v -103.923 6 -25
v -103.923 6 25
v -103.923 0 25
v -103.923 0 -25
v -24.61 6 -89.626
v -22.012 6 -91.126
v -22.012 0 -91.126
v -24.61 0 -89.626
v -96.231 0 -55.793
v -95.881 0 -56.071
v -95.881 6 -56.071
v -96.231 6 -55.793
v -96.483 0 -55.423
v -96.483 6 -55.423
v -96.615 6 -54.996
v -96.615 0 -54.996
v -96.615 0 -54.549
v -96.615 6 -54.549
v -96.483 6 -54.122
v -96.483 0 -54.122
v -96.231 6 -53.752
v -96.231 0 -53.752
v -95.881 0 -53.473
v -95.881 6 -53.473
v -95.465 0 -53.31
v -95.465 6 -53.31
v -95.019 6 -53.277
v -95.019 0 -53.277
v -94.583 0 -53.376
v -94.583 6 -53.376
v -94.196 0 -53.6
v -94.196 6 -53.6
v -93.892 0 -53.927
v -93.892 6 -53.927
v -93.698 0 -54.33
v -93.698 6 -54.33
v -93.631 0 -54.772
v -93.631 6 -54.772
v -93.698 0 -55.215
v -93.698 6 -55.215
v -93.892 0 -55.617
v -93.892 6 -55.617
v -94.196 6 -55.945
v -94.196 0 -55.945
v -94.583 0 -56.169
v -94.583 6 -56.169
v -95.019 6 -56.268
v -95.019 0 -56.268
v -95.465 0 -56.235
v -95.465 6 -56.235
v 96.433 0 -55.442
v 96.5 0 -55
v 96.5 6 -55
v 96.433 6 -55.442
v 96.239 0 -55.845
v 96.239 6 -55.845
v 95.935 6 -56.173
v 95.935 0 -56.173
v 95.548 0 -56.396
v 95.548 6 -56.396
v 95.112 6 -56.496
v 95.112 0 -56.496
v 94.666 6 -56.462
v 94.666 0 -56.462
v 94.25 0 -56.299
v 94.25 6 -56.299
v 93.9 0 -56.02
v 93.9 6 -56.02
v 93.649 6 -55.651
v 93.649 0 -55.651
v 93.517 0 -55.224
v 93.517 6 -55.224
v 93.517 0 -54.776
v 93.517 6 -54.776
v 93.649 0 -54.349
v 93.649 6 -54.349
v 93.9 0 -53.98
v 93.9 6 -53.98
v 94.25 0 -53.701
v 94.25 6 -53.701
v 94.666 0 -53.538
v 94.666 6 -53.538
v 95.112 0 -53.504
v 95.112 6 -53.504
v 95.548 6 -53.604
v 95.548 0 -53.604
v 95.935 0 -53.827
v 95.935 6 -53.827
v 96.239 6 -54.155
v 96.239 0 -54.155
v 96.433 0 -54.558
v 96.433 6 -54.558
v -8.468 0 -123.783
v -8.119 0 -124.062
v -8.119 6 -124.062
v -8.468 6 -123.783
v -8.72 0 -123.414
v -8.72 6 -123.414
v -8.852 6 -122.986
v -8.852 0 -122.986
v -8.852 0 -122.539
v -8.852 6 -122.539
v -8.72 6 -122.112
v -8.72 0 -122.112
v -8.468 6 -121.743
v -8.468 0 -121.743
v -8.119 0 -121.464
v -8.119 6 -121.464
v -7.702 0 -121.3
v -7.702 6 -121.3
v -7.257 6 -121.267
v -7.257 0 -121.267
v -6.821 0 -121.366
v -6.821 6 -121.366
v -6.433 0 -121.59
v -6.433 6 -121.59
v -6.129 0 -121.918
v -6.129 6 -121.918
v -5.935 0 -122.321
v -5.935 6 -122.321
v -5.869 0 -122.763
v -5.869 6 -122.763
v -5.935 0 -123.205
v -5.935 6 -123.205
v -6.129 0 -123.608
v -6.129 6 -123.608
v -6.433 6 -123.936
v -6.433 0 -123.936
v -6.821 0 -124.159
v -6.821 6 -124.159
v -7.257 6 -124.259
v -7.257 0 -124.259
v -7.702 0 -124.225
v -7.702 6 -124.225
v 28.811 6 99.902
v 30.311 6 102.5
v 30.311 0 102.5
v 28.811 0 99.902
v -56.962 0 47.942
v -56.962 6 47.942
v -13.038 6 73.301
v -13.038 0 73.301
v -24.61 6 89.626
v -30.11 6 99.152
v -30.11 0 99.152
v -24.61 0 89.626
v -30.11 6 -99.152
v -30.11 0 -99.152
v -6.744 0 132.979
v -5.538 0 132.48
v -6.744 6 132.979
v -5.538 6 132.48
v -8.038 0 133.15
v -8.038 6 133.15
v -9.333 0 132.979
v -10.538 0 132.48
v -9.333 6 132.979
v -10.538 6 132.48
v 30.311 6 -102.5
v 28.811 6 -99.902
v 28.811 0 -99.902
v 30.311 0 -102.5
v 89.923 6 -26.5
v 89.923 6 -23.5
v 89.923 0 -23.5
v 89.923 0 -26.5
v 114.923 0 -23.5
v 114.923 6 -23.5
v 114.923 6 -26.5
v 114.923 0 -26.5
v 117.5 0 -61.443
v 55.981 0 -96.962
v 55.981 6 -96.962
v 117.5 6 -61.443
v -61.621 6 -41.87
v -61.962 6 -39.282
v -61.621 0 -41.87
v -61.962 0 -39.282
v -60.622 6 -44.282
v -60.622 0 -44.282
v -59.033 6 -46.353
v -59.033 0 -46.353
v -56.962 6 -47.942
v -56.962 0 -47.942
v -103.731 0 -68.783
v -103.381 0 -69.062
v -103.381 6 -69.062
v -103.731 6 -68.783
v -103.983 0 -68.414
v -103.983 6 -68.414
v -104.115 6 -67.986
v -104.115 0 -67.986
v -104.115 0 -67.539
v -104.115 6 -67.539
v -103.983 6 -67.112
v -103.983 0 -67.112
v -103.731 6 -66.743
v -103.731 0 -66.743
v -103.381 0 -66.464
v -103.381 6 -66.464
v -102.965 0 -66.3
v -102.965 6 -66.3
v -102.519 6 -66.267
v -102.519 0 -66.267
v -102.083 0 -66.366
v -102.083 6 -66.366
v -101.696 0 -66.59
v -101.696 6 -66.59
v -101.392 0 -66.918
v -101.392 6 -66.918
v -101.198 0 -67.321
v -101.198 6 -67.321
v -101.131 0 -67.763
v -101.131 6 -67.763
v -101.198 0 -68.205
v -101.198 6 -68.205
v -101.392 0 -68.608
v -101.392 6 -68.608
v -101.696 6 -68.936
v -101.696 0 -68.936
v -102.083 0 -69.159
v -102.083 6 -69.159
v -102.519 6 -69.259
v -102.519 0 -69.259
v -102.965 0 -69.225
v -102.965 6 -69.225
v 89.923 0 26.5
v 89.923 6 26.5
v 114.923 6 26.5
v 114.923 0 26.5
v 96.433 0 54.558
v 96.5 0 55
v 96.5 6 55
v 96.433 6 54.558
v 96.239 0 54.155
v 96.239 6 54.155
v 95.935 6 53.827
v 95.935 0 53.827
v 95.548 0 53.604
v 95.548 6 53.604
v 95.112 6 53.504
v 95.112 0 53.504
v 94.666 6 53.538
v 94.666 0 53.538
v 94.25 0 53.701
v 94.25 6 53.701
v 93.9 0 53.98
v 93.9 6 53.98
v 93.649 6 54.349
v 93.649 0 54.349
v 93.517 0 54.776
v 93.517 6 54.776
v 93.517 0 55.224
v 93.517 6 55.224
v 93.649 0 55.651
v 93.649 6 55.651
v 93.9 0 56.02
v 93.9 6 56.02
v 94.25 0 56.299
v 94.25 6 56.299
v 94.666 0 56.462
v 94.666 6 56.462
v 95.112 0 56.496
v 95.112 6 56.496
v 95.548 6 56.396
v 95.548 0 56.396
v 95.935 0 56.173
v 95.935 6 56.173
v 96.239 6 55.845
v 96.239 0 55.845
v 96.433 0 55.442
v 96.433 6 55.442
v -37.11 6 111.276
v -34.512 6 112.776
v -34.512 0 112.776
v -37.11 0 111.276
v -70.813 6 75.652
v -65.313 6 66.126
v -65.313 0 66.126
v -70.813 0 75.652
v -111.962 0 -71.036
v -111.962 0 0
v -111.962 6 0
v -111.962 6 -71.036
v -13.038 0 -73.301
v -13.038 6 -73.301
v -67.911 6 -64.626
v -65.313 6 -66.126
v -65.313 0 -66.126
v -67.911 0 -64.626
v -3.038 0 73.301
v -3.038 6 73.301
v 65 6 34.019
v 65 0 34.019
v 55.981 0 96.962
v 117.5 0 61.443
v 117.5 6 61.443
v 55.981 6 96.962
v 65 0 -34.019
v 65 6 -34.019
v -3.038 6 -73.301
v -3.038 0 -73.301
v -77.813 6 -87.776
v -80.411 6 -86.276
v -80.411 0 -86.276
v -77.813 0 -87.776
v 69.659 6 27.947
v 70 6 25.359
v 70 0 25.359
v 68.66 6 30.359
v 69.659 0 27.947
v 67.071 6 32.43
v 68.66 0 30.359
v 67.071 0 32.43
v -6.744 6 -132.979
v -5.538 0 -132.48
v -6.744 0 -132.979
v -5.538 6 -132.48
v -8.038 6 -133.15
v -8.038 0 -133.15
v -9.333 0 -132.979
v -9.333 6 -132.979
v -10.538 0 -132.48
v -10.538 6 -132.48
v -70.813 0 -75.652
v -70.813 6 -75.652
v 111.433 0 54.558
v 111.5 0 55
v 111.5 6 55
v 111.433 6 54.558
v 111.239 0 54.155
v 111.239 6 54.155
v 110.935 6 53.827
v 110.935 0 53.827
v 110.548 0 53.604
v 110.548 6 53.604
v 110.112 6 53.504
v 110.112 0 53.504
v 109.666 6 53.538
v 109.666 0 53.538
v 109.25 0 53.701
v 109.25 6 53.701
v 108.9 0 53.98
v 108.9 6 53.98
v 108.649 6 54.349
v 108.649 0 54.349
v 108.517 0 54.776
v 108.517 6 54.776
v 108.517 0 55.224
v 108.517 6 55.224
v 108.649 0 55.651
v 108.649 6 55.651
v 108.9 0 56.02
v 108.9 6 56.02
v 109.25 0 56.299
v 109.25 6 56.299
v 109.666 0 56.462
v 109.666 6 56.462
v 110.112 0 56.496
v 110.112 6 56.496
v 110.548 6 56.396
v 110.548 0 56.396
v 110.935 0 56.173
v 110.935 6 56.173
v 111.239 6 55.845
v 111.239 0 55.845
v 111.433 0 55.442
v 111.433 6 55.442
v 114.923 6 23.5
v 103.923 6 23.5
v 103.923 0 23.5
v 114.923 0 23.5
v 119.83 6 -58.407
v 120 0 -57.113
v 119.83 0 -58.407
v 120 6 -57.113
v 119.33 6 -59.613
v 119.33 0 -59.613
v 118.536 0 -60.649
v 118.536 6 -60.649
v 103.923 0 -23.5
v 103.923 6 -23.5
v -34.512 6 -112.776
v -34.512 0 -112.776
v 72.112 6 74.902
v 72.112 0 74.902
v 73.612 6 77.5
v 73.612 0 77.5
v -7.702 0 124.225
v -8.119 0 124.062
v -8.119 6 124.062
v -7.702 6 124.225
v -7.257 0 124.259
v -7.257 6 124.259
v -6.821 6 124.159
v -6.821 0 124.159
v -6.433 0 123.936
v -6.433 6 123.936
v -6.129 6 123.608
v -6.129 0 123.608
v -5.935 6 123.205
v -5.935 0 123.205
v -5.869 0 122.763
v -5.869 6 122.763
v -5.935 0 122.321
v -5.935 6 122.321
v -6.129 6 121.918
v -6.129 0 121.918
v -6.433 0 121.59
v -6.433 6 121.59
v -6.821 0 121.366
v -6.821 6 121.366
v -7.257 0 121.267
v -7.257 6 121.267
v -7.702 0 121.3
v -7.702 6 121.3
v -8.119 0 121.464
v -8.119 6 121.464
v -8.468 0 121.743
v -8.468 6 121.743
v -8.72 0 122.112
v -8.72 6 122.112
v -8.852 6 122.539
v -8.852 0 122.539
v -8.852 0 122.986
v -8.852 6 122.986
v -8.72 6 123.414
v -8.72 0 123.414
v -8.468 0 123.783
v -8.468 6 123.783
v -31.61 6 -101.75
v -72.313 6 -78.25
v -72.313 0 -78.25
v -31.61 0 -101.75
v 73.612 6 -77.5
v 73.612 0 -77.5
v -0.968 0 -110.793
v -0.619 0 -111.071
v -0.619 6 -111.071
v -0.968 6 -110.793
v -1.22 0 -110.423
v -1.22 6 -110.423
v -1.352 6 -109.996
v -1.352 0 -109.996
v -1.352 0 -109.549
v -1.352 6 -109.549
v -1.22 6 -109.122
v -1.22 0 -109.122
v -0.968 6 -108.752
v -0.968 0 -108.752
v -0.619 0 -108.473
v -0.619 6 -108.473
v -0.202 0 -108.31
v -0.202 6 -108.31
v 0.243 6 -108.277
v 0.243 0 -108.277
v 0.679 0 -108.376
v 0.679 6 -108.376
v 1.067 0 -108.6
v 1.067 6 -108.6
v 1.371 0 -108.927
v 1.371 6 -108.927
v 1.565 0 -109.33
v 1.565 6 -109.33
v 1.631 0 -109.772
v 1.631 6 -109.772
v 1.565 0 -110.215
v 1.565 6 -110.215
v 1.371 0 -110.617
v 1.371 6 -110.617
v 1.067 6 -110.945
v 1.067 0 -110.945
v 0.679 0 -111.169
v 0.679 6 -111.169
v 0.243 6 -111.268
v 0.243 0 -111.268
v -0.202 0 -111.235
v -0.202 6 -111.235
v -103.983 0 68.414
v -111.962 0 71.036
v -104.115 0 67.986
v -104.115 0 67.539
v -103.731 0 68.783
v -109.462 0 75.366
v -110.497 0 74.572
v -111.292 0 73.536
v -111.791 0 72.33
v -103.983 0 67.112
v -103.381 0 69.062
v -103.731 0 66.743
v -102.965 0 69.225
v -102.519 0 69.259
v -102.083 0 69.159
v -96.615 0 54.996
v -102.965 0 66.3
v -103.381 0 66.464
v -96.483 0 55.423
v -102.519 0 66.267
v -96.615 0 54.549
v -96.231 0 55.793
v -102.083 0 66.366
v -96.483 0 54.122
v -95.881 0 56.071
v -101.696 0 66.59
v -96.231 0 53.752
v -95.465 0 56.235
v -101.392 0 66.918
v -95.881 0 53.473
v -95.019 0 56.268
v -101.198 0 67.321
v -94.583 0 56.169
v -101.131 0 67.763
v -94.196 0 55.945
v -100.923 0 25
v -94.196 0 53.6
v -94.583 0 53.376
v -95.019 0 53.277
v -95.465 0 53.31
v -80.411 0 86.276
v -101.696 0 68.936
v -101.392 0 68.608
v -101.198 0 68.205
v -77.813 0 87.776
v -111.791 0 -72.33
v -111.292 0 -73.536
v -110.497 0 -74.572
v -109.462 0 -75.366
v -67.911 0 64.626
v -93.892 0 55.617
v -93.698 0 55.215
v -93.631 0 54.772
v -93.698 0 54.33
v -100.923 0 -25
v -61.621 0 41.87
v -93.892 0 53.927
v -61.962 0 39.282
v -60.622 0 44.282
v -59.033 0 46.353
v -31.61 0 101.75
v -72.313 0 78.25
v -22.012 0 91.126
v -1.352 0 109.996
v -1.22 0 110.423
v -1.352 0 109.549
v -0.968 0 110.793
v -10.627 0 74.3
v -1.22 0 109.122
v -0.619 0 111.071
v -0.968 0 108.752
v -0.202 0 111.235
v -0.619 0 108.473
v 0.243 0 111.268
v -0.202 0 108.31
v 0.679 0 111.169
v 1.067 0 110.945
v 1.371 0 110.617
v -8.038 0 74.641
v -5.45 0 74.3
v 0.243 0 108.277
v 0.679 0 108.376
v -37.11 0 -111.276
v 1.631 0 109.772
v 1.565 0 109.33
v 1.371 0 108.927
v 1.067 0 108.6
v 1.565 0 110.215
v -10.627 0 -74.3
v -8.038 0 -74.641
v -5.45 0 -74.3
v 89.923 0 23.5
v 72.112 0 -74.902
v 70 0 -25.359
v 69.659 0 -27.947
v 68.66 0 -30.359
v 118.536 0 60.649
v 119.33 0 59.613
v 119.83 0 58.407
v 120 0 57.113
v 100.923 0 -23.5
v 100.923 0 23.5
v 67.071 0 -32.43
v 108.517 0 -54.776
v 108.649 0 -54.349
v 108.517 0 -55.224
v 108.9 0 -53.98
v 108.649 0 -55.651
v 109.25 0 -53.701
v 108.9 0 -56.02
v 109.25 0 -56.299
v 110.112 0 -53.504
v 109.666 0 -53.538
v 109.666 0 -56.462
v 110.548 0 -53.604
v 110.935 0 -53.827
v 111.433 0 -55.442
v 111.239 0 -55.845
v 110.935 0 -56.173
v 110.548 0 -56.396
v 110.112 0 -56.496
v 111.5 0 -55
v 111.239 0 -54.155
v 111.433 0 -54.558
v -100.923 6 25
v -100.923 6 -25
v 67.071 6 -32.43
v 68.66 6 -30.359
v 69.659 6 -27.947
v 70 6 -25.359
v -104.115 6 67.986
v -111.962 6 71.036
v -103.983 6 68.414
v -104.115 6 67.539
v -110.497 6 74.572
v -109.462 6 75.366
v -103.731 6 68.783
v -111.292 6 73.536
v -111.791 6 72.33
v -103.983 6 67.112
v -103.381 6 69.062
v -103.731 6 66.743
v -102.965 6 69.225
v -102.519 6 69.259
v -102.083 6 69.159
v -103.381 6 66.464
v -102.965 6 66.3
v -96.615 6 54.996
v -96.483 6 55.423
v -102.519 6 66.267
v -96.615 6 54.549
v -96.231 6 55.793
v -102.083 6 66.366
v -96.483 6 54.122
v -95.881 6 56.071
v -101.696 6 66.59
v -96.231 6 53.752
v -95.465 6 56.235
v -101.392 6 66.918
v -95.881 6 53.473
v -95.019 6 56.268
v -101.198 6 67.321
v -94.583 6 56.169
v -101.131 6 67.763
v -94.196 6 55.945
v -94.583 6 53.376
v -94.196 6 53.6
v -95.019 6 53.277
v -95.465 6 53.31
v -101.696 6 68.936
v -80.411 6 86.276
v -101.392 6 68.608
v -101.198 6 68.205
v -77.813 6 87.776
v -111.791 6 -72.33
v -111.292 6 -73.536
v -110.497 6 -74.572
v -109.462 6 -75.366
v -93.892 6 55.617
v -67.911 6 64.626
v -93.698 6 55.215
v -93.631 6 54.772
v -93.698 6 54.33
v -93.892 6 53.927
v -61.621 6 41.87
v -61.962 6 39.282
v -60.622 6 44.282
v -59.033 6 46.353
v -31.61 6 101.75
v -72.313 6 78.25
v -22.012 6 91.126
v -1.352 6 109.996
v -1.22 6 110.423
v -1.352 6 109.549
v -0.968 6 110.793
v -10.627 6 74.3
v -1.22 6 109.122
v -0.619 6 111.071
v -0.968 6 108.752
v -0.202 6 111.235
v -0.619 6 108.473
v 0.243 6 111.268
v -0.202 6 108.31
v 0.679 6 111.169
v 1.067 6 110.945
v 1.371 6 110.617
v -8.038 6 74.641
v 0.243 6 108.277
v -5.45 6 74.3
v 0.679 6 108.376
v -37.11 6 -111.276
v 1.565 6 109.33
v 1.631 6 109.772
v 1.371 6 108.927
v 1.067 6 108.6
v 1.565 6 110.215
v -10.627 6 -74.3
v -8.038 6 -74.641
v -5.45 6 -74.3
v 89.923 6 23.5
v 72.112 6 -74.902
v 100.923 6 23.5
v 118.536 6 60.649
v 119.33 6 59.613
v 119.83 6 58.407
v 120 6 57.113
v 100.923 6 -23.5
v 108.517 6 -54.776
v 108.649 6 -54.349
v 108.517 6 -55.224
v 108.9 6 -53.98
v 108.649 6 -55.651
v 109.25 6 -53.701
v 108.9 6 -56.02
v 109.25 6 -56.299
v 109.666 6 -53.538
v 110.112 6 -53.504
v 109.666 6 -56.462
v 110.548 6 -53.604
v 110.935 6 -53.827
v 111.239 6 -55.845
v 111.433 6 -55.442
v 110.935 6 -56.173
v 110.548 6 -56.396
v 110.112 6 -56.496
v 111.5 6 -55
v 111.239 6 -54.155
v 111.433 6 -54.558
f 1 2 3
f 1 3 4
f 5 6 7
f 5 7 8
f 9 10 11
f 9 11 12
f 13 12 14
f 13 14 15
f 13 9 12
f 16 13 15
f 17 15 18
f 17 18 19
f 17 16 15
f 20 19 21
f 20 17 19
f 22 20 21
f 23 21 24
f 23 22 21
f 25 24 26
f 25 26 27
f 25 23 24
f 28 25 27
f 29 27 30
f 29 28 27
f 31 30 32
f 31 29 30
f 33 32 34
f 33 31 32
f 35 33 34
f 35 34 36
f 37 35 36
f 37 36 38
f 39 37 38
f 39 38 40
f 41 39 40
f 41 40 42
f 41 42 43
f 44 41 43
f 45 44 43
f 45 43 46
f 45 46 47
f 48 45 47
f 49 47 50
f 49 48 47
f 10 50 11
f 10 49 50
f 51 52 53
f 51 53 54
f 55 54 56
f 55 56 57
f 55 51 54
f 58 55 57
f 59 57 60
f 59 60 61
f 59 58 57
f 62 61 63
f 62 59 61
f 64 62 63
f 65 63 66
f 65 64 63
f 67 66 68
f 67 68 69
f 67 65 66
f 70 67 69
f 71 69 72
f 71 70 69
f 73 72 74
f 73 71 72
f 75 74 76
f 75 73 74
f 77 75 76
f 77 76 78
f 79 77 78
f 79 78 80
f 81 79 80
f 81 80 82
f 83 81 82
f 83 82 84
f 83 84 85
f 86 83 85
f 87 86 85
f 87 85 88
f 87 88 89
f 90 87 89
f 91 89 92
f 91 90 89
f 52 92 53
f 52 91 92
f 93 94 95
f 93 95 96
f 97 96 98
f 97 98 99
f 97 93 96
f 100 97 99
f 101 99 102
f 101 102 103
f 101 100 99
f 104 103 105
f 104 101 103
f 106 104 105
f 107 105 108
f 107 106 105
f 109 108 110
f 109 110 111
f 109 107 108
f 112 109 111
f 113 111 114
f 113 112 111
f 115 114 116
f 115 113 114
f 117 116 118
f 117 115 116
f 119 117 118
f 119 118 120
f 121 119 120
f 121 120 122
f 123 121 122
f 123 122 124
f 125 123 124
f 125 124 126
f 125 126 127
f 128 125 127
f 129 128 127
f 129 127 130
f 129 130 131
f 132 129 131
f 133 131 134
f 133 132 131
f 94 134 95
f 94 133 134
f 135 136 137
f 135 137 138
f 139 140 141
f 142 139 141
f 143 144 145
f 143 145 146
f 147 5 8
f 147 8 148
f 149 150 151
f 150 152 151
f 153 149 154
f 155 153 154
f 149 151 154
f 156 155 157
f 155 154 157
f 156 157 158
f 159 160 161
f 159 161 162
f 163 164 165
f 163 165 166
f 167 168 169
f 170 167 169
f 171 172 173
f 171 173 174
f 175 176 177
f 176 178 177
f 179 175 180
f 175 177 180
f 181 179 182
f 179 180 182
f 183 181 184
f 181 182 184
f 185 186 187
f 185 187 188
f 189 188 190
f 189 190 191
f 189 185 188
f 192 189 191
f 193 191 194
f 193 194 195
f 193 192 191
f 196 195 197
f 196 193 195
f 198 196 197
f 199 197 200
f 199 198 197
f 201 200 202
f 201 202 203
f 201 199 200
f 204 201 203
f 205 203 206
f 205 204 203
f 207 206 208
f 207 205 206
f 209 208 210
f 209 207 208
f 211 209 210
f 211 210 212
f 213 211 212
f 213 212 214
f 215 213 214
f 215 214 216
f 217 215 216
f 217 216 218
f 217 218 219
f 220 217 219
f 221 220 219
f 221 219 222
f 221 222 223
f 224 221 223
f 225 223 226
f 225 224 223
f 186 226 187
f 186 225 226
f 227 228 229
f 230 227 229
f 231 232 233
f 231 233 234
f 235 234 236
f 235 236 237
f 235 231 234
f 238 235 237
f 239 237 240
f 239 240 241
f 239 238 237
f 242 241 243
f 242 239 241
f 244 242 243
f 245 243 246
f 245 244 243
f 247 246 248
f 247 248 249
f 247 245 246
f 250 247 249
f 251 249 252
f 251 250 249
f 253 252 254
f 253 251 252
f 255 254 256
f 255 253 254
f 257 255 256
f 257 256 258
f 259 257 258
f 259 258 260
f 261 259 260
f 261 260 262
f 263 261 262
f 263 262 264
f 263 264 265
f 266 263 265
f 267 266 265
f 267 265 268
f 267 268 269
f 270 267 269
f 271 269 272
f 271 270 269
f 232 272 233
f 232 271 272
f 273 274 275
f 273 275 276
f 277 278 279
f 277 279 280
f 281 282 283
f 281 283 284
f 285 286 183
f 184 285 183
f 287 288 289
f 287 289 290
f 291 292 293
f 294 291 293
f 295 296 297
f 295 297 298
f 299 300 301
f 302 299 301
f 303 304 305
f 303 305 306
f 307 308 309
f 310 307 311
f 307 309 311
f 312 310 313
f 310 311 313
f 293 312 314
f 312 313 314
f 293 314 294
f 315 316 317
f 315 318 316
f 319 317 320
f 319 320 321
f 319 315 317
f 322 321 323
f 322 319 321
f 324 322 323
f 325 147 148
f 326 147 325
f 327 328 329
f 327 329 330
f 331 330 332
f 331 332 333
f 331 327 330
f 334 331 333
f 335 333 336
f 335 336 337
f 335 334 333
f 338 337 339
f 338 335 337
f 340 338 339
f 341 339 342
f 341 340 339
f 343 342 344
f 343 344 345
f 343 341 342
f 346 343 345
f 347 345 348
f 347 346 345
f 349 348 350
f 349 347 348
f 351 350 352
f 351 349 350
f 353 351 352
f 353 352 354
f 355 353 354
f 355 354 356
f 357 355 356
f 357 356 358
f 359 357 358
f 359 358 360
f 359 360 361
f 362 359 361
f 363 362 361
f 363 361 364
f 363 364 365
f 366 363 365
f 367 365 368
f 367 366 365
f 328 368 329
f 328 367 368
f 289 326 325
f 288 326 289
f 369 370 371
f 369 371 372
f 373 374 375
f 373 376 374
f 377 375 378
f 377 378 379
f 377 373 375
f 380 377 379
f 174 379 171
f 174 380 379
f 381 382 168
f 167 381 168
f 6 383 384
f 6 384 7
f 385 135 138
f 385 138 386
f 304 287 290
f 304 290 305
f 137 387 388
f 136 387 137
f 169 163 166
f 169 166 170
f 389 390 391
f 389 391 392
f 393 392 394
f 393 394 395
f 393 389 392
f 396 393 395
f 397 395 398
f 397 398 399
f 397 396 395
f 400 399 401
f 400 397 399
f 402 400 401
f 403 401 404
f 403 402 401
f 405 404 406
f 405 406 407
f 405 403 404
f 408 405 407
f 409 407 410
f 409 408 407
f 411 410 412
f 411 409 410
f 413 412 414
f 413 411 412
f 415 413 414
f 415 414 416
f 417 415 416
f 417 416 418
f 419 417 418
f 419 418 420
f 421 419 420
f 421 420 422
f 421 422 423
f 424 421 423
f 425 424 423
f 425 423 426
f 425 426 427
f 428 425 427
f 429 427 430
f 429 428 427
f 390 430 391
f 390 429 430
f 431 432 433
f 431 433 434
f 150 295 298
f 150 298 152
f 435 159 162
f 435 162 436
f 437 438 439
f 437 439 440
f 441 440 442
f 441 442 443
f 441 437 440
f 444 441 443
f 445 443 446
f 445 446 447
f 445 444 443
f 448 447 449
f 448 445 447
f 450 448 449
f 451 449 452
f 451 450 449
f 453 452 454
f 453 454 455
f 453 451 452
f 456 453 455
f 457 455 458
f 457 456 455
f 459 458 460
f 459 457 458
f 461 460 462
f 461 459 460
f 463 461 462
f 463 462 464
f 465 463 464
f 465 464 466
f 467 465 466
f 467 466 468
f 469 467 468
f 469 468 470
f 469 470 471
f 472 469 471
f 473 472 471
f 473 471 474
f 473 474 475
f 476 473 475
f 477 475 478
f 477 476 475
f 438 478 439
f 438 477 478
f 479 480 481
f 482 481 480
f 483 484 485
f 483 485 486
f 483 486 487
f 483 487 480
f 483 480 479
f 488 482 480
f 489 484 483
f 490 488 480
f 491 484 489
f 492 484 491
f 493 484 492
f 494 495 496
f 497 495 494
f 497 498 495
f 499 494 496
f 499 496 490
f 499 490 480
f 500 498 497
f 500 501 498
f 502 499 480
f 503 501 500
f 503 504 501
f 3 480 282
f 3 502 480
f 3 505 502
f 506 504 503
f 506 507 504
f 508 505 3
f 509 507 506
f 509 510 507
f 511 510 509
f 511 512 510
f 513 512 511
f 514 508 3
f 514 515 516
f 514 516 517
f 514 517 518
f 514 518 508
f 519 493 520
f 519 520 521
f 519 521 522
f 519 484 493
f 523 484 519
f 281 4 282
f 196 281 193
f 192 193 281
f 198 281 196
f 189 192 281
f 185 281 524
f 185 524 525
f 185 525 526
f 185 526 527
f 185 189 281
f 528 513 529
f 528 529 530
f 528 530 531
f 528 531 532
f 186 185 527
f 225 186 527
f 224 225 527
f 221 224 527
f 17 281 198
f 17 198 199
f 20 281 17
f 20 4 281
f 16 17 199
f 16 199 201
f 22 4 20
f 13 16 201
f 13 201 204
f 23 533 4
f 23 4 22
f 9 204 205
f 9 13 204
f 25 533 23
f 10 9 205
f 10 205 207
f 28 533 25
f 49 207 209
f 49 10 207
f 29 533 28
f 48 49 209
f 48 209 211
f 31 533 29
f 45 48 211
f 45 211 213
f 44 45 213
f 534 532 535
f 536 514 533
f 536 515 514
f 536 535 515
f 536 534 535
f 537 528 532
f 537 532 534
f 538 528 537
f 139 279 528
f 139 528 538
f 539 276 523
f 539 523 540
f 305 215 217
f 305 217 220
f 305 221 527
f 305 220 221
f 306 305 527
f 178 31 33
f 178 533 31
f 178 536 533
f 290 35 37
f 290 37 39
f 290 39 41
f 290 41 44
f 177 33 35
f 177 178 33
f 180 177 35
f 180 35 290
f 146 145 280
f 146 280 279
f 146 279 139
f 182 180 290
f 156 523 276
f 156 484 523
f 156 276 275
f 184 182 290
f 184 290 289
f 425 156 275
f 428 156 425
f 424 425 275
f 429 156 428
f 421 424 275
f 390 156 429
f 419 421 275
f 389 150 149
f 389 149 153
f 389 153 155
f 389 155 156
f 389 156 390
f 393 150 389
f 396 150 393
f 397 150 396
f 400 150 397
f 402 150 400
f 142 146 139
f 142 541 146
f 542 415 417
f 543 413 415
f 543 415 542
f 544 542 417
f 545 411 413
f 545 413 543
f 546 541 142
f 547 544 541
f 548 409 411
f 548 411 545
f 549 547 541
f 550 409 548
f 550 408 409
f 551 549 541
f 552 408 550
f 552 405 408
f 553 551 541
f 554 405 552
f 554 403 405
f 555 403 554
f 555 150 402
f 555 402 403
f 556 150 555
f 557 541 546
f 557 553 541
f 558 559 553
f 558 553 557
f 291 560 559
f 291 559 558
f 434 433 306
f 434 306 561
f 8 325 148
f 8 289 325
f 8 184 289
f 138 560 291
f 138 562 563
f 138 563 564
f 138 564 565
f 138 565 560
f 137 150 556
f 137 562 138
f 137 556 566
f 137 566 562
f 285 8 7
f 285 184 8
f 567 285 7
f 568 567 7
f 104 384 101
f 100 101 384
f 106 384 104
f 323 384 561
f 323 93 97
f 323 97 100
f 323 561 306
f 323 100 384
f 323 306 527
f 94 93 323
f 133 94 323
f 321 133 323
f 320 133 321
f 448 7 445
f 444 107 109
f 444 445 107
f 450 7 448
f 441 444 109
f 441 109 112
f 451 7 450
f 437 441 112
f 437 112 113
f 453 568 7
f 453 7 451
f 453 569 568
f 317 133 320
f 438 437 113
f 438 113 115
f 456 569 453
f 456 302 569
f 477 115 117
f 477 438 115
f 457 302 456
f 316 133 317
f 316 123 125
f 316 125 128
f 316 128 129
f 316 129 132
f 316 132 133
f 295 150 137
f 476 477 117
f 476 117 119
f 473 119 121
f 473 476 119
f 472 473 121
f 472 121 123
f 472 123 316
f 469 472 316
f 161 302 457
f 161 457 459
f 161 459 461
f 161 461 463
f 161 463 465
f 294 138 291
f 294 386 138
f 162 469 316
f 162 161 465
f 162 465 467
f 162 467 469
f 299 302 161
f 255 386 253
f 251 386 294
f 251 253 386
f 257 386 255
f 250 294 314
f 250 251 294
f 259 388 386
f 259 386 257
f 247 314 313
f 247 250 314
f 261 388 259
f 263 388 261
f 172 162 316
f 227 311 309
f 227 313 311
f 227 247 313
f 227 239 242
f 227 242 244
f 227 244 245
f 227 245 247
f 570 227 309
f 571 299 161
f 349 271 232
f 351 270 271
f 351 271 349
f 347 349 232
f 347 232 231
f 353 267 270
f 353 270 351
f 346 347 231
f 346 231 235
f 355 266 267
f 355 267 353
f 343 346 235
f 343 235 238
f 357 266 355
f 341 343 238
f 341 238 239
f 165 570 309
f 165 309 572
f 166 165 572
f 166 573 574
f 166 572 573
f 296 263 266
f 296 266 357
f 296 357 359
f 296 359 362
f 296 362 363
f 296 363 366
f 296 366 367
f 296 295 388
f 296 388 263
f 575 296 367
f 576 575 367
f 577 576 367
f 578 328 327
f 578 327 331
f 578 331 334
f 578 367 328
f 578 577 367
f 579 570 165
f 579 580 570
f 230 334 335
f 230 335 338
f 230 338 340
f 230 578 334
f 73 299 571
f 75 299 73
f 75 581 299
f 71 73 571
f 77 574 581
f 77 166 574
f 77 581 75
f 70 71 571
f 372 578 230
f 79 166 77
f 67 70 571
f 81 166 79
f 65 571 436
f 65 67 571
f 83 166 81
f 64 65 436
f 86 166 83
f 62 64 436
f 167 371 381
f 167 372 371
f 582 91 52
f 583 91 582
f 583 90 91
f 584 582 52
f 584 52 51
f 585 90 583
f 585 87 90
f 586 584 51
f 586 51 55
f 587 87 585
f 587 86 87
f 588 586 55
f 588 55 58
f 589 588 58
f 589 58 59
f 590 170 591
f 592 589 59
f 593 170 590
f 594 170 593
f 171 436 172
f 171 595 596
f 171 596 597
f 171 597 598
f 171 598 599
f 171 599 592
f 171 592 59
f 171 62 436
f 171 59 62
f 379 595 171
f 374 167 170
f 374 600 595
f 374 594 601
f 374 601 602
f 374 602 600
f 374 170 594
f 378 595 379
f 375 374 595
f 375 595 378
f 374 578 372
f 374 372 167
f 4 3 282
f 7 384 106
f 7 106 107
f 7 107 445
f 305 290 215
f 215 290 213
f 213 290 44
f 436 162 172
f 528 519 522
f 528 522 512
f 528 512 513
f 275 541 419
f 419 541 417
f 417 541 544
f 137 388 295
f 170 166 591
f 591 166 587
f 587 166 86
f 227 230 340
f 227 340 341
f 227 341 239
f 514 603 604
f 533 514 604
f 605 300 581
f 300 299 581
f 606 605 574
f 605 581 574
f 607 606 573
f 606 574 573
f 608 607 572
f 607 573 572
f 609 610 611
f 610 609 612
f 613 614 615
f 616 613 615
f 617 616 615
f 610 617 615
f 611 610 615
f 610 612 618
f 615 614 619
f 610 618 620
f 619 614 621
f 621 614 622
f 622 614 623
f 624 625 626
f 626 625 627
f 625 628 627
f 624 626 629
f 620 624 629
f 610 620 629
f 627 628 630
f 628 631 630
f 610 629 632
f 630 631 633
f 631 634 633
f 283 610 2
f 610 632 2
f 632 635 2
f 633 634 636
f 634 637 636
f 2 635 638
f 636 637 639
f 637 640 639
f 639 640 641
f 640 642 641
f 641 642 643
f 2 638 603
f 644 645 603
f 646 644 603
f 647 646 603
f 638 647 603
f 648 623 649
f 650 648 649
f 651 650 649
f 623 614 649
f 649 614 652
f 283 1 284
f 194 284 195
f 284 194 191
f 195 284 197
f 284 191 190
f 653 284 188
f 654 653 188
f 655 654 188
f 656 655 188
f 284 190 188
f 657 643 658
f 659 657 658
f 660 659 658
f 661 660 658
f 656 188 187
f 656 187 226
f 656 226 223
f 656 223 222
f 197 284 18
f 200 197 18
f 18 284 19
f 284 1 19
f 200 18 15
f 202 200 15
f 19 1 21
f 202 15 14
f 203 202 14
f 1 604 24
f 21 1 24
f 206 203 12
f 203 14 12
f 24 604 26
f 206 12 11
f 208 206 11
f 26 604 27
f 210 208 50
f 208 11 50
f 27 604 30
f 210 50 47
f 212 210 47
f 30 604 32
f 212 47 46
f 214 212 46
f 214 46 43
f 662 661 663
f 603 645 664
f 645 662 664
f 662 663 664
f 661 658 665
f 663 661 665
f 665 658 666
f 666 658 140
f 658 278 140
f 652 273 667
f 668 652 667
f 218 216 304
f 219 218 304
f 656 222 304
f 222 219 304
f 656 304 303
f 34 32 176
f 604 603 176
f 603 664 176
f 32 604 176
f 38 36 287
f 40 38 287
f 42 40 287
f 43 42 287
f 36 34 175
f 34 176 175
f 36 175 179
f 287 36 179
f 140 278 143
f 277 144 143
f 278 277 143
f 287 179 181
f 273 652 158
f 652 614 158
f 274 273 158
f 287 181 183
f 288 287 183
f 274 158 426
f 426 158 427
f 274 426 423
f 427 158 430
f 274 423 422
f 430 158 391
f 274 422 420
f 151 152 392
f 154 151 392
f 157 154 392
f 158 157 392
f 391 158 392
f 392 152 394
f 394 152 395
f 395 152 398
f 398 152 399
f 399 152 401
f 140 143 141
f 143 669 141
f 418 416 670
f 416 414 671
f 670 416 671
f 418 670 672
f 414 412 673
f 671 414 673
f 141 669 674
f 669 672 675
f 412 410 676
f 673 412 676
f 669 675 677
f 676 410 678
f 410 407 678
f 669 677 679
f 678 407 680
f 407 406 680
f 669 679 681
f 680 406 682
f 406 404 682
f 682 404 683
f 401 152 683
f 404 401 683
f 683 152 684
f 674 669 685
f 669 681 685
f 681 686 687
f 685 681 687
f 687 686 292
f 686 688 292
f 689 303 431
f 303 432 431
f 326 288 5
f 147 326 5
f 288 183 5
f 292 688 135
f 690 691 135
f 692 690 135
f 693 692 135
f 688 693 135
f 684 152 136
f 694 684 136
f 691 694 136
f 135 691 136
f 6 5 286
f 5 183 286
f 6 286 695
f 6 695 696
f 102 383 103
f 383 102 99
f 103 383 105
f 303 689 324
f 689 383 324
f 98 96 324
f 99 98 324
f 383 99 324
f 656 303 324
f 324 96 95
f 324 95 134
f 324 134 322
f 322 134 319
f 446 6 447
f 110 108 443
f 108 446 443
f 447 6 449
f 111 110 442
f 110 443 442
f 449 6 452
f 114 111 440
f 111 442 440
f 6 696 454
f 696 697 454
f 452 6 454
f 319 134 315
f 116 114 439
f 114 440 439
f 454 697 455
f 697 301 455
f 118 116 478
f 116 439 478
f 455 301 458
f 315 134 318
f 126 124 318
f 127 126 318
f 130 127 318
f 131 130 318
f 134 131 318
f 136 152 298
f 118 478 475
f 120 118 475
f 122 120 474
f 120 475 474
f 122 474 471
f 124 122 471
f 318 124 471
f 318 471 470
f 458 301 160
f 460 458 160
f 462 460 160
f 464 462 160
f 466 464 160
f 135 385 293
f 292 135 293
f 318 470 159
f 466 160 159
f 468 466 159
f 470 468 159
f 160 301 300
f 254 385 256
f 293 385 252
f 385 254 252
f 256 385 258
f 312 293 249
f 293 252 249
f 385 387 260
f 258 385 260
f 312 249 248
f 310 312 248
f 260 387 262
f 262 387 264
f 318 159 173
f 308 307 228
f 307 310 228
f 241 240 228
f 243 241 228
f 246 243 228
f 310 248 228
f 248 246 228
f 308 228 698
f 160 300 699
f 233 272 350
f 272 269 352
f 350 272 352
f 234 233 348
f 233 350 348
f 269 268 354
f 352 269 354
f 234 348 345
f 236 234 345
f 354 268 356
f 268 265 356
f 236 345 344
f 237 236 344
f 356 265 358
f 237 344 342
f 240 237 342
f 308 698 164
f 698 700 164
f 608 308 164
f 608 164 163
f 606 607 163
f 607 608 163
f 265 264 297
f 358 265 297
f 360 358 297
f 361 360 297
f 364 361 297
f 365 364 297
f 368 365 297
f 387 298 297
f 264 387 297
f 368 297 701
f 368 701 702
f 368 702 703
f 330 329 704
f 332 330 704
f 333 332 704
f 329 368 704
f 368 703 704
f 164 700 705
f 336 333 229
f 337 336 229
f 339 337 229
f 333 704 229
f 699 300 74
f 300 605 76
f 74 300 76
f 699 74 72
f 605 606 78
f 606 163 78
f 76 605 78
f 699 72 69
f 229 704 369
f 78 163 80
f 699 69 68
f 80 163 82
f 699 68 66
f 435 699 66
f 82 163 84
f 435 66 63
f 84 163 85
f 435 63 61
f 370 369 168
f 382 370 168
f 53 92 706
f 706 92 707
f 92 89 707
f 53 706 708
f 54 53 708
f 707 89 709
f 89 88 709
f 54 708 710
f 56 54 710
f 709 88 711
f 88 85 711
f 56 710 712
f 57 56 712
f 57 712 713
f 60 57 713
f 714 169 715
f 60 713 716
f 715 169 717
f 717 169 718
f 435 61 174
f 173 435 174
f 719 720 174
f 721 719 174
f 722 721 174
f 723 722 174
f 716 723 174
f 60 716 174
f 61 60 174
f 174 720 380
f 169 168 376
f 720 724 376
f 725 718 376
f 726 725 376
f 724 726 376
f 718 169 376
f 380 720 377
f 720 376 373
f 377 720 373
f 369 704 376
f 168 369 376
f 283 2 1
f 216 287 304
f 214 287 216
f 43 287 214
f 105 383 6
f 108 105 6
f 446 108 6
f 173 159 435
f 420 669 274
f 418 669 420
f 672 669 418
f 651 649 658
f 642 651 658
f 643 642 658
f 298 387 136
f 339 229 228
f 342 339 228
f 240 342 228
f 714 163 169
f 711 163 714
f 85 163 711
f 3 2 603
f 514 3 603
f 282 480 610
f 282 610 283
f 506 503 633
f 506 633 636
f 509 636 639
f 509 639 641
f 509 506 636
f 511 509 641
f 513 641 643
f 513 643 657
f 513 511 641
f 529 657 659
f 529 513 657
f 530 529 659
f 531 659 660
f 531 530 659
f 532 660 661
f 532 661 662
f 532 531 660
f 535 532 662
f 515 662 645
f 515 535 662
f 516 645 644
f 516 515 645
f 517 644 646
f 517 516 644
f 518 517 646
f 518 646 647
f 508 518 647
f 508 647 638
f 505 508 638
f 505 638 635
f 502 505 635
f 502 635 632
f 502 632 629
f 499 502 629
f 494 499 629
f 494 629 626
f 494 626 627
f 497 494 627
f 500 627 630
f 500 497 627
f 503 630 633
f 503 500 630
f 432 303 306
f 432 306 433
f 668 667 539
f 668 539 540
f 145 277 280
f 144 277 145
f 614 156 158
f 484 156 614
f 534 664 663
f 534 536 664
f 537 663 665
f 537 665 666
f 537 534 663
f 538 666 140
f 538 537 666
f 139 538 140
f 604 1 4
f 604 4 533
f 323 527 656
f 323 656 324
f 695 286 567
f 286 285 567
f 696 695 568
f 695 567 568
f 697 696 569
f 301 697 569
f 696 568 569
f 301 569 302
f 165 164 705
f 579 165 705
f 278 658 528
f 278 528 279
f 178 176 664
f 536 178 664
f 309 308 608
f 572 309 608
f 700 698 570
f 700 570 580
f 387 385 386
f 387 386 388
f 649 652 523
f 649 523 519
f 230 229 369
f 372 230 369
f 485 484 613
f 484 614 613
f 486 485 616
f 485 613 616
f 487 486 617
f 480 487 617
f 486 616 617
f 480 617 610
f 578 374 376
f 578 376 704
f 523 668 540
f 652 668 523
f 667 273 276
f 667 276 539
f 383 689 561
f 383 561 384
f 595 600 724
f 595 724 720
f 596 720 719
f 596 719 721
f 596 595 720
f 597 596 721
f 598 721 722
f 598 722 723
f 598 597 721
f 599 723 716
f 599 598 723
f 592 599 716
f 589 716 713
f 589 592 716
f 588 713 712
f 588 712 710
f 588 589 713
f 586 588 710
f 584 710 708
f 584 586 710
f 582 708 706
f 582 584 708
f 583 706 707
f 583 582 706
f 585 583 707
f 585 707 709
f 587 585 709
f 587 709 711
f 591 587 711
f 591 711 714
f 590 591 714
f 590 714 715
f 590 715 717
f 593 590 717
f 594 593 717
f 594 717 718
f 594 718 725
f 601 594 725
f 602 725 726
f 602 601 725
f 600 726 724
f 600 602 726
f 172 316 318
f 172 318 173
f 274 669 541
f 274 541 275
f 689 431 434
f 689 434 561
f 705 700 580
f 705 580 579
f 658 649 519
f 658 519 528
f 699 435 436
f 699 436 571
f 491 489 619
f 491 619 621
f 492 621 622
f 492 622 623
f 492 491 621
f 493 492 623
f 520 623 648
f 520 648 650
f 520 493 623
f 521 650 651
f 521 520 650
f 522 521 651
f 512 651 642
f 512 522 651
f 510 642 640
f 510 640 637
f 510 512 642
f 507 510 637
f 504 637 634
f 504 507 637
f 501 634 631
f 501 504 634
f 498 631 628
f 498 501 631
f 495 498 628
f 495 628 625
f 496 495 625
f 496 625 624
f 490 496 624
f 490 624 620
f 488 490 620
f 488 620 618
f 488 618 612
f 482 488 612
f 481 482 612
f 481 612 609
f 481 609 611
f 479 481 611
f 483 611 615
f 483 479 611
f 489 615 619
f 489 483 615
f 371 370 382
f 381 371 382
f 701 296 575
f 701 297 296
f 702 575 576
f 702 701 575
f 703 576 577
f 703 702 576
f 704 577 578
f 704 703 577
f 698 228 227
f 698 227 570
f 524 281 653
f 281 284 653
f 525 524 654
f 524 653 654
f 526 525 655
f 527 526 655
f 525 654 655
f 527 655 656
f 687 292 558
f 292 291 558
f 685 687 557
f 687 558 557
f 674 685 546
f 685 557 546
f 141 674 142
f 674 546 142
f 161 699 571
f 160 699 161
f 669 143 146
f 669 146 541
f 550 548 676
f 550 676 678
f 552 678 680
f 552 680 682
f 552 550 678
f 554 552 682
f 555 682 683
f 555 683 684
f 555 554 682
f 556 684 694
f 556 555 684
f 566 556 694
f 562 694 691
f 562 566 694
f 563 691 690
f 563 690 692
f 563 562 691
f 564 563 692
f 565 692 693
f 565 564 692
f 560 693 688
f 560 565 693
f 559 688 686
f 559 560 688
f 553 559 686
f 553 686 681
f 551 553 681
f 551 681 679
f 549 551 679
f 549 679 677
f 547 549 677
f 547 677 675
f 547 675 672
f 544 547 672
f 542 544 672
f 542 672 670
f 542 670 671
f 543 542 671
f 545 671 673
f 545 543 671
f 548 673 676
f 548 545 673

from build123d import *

# Parameters (mm, degrees)
SKETCH6_R           = 1.5
BOSS_EXTRUDE4_DEPTH = 6
CIRPATTERN1_COUNT   = 3
SKETCH8_W           = 3
SKETCH8_H           = 50
CUT_EXTRUDE3_DEPTH  = 7
CUT_EXTRUDE4_DEPTH  = 7
FILLET1_R           = 10
FILLET2_R           = 5
SKETCH9_W           = 25
SKETCH9_H           = 3
CUT_EXTRUDE5_DEPTH  = 7


with BuildPart() as part:
    # Sketch6 → Boss-Extrude4 (new body)
    with BuildSketch(Plane(origin=(0, 0, 0), x_dir=(1, 0, 0), z_dir=(0, 1, 0))):
        Polygon((0, 0), (55.980762114, 96.961524227), (120, 60), (120, -60), (55.980762114, -96.961524227), align=None)
        with Locations((95, 55)):
            Circle(SKETCH6_R, mode=Mode.SUBTRACT)
        with Locations((110, 55)):
            Circle(SKETCH6_R, mode=Mode.SUBTRACT)
        with Locations((95, -55)):
            Circle(SKETCH6_R, mode=Mode.SUBTRACT)
        with Locations((110, -55)):
            Circle(SKETCH6_R, mode=Mode.SUBTRACT)
    boss_extrude4 = extrude(amount=BOSS_EXTRUDE4_DEPTH)

    # CirPattern1: Boss-Extrude4 ×3 about axis
    cirpattern1_axis = Axis((0, 0, 0), (0, 1, 0))
    for i in range(1, CIRPATTERN1_COUNT):
        add(boss_extrude4.rotate(cirpattern1_axis, i * 360 / CIRPATTERN1_COUNT))

    # Sketch8 → Cut-Extrude3 (cut, through all)
    with BuildSketch(Plane(origin=(0, 6, 0), x_dir=(1, 0, 0), z_dir=(0, 1, 0))):
        Polygon((73.612159322, -77.5), (30.310889132, -102.5), (28.810889132, -99.901923789), (72.112159322, -74.901923789), align=None)
        with Locations((102.423048454, 0)):
            Rectangle(SKETCH8_W, SKETCH8_H)
        Polygon((-30.310889132, -102.5), (-73.612159322, -77.5), (-72.112159322, -74.901923789), (-28.810889132, -99.901923789), align=None)
        with Locations((-102.423048454, 0)):
            Rectangle(SKETCH8_W, SKETCH8_H)
        Polygon((-73.612159322, 77.5), (-30.310889132, 102.5), (-28.810889132, 99.901923789), (-72.112159322, 74.901923789), align=None)
        Polygon((30.310889132, 102.5), (73.612159322, 77.5), (72.112159322, 74.901923789), (28.810889132, 99.901923789), align=None)
    extrude(amount=-CUT_EXTRUDE3_DEPTH, mode=Mode.SUBTRACT)

    # Sketch7 → Cut-Extrude4 (cut, through all)
    with BuildSketch(Plane(origin=(0, 6, 0), x_dir=(1, 0, 0), z_dir=(0, 1, 0))):
        Polygon((-61.961524227, 45.055534995), (-61.961524227, -45.055534995), (-8.038475773, -76.188021535), (70, -31.132486541), (70, 31.132486541), (-8.038475773, 76.188021535), align=None)
    extrude(amount=-CUT_EXTRUDE4_DEPTH, mode=Mode.SUBTRACT)

    # Fillet1
    fillet1_edges = [part.edges().sort_by_distance(p)[0] for p in [
        (-61.961524227, 3, -45.055534995),
        (-8.038475773, 3, -76.188021535),
        (70, 3, -31.132486541),
        (70, 3, 31.132486541),
        (-8.038475773, 3, 76.188021535),
        (-61.961524227, 3, 45.055534995),
    ]]
    fillet(fillet1_edges, radius=FILLET1_R)

    # Fillet2
    fillet2_edges = [part.edges().sort_by_distance(p)[0] for p in [
        (-8.038475773, 3, -133.923048454),
        (-111.961524227, 3, -73.923048454),
        (-111.961524227, 3, 73.923048454),
        (-8.038475773, 3, 133.923048454),
        (120, 3, -60),
        (120, 3, 60),
    ]]
    fillet(fillet2_edges, radius=FILLET2_R)

    # Sketch9 → Cut-Extrude5 (cut, through all)
    with BuildSketch(Plane(origin=(0, 6, 0), x_dir=(1, 0, 0), z_dir=(0, 1, 0))):
        with Locations((102.423048454, -25)):
            Rectangle(SKETCH9_W, SKETCH9_H)
        with Locations((102.423048454, 25)):
            Rectangle(SKETCH9_W, SKETCH9_H)
        Polygon((-67.911197427, -64.625644347), (-65.313121216, -66.125644347), (-77.813121216, -87.776279442), (-80.411197427, -86.276279442), align=None)
        Polygon((-24.609927238, -89.625644347), (-22.011851027, -91.125644347), (-34.511851027, -112.776279442), (-37.109927238, -111.276279442), align=None)
        Polygon((-22.011851027, 91.125644347), (-24.609927238, 89.625644347), (-37.109927238, 111.276279442), (-34.511851027, 112.776279442), align=None)
        Polygon((-65.313121216, 66.125644347), (-67.911197427, 64.625644347), (-80.411197427, 86.276279442), (-77.813121216, 87.776279442), align=None)
    extrude(amount=-CUT_EXTRUDE5_DEPTH, mode=Mode.SUBTRACT)


solid = part.part
